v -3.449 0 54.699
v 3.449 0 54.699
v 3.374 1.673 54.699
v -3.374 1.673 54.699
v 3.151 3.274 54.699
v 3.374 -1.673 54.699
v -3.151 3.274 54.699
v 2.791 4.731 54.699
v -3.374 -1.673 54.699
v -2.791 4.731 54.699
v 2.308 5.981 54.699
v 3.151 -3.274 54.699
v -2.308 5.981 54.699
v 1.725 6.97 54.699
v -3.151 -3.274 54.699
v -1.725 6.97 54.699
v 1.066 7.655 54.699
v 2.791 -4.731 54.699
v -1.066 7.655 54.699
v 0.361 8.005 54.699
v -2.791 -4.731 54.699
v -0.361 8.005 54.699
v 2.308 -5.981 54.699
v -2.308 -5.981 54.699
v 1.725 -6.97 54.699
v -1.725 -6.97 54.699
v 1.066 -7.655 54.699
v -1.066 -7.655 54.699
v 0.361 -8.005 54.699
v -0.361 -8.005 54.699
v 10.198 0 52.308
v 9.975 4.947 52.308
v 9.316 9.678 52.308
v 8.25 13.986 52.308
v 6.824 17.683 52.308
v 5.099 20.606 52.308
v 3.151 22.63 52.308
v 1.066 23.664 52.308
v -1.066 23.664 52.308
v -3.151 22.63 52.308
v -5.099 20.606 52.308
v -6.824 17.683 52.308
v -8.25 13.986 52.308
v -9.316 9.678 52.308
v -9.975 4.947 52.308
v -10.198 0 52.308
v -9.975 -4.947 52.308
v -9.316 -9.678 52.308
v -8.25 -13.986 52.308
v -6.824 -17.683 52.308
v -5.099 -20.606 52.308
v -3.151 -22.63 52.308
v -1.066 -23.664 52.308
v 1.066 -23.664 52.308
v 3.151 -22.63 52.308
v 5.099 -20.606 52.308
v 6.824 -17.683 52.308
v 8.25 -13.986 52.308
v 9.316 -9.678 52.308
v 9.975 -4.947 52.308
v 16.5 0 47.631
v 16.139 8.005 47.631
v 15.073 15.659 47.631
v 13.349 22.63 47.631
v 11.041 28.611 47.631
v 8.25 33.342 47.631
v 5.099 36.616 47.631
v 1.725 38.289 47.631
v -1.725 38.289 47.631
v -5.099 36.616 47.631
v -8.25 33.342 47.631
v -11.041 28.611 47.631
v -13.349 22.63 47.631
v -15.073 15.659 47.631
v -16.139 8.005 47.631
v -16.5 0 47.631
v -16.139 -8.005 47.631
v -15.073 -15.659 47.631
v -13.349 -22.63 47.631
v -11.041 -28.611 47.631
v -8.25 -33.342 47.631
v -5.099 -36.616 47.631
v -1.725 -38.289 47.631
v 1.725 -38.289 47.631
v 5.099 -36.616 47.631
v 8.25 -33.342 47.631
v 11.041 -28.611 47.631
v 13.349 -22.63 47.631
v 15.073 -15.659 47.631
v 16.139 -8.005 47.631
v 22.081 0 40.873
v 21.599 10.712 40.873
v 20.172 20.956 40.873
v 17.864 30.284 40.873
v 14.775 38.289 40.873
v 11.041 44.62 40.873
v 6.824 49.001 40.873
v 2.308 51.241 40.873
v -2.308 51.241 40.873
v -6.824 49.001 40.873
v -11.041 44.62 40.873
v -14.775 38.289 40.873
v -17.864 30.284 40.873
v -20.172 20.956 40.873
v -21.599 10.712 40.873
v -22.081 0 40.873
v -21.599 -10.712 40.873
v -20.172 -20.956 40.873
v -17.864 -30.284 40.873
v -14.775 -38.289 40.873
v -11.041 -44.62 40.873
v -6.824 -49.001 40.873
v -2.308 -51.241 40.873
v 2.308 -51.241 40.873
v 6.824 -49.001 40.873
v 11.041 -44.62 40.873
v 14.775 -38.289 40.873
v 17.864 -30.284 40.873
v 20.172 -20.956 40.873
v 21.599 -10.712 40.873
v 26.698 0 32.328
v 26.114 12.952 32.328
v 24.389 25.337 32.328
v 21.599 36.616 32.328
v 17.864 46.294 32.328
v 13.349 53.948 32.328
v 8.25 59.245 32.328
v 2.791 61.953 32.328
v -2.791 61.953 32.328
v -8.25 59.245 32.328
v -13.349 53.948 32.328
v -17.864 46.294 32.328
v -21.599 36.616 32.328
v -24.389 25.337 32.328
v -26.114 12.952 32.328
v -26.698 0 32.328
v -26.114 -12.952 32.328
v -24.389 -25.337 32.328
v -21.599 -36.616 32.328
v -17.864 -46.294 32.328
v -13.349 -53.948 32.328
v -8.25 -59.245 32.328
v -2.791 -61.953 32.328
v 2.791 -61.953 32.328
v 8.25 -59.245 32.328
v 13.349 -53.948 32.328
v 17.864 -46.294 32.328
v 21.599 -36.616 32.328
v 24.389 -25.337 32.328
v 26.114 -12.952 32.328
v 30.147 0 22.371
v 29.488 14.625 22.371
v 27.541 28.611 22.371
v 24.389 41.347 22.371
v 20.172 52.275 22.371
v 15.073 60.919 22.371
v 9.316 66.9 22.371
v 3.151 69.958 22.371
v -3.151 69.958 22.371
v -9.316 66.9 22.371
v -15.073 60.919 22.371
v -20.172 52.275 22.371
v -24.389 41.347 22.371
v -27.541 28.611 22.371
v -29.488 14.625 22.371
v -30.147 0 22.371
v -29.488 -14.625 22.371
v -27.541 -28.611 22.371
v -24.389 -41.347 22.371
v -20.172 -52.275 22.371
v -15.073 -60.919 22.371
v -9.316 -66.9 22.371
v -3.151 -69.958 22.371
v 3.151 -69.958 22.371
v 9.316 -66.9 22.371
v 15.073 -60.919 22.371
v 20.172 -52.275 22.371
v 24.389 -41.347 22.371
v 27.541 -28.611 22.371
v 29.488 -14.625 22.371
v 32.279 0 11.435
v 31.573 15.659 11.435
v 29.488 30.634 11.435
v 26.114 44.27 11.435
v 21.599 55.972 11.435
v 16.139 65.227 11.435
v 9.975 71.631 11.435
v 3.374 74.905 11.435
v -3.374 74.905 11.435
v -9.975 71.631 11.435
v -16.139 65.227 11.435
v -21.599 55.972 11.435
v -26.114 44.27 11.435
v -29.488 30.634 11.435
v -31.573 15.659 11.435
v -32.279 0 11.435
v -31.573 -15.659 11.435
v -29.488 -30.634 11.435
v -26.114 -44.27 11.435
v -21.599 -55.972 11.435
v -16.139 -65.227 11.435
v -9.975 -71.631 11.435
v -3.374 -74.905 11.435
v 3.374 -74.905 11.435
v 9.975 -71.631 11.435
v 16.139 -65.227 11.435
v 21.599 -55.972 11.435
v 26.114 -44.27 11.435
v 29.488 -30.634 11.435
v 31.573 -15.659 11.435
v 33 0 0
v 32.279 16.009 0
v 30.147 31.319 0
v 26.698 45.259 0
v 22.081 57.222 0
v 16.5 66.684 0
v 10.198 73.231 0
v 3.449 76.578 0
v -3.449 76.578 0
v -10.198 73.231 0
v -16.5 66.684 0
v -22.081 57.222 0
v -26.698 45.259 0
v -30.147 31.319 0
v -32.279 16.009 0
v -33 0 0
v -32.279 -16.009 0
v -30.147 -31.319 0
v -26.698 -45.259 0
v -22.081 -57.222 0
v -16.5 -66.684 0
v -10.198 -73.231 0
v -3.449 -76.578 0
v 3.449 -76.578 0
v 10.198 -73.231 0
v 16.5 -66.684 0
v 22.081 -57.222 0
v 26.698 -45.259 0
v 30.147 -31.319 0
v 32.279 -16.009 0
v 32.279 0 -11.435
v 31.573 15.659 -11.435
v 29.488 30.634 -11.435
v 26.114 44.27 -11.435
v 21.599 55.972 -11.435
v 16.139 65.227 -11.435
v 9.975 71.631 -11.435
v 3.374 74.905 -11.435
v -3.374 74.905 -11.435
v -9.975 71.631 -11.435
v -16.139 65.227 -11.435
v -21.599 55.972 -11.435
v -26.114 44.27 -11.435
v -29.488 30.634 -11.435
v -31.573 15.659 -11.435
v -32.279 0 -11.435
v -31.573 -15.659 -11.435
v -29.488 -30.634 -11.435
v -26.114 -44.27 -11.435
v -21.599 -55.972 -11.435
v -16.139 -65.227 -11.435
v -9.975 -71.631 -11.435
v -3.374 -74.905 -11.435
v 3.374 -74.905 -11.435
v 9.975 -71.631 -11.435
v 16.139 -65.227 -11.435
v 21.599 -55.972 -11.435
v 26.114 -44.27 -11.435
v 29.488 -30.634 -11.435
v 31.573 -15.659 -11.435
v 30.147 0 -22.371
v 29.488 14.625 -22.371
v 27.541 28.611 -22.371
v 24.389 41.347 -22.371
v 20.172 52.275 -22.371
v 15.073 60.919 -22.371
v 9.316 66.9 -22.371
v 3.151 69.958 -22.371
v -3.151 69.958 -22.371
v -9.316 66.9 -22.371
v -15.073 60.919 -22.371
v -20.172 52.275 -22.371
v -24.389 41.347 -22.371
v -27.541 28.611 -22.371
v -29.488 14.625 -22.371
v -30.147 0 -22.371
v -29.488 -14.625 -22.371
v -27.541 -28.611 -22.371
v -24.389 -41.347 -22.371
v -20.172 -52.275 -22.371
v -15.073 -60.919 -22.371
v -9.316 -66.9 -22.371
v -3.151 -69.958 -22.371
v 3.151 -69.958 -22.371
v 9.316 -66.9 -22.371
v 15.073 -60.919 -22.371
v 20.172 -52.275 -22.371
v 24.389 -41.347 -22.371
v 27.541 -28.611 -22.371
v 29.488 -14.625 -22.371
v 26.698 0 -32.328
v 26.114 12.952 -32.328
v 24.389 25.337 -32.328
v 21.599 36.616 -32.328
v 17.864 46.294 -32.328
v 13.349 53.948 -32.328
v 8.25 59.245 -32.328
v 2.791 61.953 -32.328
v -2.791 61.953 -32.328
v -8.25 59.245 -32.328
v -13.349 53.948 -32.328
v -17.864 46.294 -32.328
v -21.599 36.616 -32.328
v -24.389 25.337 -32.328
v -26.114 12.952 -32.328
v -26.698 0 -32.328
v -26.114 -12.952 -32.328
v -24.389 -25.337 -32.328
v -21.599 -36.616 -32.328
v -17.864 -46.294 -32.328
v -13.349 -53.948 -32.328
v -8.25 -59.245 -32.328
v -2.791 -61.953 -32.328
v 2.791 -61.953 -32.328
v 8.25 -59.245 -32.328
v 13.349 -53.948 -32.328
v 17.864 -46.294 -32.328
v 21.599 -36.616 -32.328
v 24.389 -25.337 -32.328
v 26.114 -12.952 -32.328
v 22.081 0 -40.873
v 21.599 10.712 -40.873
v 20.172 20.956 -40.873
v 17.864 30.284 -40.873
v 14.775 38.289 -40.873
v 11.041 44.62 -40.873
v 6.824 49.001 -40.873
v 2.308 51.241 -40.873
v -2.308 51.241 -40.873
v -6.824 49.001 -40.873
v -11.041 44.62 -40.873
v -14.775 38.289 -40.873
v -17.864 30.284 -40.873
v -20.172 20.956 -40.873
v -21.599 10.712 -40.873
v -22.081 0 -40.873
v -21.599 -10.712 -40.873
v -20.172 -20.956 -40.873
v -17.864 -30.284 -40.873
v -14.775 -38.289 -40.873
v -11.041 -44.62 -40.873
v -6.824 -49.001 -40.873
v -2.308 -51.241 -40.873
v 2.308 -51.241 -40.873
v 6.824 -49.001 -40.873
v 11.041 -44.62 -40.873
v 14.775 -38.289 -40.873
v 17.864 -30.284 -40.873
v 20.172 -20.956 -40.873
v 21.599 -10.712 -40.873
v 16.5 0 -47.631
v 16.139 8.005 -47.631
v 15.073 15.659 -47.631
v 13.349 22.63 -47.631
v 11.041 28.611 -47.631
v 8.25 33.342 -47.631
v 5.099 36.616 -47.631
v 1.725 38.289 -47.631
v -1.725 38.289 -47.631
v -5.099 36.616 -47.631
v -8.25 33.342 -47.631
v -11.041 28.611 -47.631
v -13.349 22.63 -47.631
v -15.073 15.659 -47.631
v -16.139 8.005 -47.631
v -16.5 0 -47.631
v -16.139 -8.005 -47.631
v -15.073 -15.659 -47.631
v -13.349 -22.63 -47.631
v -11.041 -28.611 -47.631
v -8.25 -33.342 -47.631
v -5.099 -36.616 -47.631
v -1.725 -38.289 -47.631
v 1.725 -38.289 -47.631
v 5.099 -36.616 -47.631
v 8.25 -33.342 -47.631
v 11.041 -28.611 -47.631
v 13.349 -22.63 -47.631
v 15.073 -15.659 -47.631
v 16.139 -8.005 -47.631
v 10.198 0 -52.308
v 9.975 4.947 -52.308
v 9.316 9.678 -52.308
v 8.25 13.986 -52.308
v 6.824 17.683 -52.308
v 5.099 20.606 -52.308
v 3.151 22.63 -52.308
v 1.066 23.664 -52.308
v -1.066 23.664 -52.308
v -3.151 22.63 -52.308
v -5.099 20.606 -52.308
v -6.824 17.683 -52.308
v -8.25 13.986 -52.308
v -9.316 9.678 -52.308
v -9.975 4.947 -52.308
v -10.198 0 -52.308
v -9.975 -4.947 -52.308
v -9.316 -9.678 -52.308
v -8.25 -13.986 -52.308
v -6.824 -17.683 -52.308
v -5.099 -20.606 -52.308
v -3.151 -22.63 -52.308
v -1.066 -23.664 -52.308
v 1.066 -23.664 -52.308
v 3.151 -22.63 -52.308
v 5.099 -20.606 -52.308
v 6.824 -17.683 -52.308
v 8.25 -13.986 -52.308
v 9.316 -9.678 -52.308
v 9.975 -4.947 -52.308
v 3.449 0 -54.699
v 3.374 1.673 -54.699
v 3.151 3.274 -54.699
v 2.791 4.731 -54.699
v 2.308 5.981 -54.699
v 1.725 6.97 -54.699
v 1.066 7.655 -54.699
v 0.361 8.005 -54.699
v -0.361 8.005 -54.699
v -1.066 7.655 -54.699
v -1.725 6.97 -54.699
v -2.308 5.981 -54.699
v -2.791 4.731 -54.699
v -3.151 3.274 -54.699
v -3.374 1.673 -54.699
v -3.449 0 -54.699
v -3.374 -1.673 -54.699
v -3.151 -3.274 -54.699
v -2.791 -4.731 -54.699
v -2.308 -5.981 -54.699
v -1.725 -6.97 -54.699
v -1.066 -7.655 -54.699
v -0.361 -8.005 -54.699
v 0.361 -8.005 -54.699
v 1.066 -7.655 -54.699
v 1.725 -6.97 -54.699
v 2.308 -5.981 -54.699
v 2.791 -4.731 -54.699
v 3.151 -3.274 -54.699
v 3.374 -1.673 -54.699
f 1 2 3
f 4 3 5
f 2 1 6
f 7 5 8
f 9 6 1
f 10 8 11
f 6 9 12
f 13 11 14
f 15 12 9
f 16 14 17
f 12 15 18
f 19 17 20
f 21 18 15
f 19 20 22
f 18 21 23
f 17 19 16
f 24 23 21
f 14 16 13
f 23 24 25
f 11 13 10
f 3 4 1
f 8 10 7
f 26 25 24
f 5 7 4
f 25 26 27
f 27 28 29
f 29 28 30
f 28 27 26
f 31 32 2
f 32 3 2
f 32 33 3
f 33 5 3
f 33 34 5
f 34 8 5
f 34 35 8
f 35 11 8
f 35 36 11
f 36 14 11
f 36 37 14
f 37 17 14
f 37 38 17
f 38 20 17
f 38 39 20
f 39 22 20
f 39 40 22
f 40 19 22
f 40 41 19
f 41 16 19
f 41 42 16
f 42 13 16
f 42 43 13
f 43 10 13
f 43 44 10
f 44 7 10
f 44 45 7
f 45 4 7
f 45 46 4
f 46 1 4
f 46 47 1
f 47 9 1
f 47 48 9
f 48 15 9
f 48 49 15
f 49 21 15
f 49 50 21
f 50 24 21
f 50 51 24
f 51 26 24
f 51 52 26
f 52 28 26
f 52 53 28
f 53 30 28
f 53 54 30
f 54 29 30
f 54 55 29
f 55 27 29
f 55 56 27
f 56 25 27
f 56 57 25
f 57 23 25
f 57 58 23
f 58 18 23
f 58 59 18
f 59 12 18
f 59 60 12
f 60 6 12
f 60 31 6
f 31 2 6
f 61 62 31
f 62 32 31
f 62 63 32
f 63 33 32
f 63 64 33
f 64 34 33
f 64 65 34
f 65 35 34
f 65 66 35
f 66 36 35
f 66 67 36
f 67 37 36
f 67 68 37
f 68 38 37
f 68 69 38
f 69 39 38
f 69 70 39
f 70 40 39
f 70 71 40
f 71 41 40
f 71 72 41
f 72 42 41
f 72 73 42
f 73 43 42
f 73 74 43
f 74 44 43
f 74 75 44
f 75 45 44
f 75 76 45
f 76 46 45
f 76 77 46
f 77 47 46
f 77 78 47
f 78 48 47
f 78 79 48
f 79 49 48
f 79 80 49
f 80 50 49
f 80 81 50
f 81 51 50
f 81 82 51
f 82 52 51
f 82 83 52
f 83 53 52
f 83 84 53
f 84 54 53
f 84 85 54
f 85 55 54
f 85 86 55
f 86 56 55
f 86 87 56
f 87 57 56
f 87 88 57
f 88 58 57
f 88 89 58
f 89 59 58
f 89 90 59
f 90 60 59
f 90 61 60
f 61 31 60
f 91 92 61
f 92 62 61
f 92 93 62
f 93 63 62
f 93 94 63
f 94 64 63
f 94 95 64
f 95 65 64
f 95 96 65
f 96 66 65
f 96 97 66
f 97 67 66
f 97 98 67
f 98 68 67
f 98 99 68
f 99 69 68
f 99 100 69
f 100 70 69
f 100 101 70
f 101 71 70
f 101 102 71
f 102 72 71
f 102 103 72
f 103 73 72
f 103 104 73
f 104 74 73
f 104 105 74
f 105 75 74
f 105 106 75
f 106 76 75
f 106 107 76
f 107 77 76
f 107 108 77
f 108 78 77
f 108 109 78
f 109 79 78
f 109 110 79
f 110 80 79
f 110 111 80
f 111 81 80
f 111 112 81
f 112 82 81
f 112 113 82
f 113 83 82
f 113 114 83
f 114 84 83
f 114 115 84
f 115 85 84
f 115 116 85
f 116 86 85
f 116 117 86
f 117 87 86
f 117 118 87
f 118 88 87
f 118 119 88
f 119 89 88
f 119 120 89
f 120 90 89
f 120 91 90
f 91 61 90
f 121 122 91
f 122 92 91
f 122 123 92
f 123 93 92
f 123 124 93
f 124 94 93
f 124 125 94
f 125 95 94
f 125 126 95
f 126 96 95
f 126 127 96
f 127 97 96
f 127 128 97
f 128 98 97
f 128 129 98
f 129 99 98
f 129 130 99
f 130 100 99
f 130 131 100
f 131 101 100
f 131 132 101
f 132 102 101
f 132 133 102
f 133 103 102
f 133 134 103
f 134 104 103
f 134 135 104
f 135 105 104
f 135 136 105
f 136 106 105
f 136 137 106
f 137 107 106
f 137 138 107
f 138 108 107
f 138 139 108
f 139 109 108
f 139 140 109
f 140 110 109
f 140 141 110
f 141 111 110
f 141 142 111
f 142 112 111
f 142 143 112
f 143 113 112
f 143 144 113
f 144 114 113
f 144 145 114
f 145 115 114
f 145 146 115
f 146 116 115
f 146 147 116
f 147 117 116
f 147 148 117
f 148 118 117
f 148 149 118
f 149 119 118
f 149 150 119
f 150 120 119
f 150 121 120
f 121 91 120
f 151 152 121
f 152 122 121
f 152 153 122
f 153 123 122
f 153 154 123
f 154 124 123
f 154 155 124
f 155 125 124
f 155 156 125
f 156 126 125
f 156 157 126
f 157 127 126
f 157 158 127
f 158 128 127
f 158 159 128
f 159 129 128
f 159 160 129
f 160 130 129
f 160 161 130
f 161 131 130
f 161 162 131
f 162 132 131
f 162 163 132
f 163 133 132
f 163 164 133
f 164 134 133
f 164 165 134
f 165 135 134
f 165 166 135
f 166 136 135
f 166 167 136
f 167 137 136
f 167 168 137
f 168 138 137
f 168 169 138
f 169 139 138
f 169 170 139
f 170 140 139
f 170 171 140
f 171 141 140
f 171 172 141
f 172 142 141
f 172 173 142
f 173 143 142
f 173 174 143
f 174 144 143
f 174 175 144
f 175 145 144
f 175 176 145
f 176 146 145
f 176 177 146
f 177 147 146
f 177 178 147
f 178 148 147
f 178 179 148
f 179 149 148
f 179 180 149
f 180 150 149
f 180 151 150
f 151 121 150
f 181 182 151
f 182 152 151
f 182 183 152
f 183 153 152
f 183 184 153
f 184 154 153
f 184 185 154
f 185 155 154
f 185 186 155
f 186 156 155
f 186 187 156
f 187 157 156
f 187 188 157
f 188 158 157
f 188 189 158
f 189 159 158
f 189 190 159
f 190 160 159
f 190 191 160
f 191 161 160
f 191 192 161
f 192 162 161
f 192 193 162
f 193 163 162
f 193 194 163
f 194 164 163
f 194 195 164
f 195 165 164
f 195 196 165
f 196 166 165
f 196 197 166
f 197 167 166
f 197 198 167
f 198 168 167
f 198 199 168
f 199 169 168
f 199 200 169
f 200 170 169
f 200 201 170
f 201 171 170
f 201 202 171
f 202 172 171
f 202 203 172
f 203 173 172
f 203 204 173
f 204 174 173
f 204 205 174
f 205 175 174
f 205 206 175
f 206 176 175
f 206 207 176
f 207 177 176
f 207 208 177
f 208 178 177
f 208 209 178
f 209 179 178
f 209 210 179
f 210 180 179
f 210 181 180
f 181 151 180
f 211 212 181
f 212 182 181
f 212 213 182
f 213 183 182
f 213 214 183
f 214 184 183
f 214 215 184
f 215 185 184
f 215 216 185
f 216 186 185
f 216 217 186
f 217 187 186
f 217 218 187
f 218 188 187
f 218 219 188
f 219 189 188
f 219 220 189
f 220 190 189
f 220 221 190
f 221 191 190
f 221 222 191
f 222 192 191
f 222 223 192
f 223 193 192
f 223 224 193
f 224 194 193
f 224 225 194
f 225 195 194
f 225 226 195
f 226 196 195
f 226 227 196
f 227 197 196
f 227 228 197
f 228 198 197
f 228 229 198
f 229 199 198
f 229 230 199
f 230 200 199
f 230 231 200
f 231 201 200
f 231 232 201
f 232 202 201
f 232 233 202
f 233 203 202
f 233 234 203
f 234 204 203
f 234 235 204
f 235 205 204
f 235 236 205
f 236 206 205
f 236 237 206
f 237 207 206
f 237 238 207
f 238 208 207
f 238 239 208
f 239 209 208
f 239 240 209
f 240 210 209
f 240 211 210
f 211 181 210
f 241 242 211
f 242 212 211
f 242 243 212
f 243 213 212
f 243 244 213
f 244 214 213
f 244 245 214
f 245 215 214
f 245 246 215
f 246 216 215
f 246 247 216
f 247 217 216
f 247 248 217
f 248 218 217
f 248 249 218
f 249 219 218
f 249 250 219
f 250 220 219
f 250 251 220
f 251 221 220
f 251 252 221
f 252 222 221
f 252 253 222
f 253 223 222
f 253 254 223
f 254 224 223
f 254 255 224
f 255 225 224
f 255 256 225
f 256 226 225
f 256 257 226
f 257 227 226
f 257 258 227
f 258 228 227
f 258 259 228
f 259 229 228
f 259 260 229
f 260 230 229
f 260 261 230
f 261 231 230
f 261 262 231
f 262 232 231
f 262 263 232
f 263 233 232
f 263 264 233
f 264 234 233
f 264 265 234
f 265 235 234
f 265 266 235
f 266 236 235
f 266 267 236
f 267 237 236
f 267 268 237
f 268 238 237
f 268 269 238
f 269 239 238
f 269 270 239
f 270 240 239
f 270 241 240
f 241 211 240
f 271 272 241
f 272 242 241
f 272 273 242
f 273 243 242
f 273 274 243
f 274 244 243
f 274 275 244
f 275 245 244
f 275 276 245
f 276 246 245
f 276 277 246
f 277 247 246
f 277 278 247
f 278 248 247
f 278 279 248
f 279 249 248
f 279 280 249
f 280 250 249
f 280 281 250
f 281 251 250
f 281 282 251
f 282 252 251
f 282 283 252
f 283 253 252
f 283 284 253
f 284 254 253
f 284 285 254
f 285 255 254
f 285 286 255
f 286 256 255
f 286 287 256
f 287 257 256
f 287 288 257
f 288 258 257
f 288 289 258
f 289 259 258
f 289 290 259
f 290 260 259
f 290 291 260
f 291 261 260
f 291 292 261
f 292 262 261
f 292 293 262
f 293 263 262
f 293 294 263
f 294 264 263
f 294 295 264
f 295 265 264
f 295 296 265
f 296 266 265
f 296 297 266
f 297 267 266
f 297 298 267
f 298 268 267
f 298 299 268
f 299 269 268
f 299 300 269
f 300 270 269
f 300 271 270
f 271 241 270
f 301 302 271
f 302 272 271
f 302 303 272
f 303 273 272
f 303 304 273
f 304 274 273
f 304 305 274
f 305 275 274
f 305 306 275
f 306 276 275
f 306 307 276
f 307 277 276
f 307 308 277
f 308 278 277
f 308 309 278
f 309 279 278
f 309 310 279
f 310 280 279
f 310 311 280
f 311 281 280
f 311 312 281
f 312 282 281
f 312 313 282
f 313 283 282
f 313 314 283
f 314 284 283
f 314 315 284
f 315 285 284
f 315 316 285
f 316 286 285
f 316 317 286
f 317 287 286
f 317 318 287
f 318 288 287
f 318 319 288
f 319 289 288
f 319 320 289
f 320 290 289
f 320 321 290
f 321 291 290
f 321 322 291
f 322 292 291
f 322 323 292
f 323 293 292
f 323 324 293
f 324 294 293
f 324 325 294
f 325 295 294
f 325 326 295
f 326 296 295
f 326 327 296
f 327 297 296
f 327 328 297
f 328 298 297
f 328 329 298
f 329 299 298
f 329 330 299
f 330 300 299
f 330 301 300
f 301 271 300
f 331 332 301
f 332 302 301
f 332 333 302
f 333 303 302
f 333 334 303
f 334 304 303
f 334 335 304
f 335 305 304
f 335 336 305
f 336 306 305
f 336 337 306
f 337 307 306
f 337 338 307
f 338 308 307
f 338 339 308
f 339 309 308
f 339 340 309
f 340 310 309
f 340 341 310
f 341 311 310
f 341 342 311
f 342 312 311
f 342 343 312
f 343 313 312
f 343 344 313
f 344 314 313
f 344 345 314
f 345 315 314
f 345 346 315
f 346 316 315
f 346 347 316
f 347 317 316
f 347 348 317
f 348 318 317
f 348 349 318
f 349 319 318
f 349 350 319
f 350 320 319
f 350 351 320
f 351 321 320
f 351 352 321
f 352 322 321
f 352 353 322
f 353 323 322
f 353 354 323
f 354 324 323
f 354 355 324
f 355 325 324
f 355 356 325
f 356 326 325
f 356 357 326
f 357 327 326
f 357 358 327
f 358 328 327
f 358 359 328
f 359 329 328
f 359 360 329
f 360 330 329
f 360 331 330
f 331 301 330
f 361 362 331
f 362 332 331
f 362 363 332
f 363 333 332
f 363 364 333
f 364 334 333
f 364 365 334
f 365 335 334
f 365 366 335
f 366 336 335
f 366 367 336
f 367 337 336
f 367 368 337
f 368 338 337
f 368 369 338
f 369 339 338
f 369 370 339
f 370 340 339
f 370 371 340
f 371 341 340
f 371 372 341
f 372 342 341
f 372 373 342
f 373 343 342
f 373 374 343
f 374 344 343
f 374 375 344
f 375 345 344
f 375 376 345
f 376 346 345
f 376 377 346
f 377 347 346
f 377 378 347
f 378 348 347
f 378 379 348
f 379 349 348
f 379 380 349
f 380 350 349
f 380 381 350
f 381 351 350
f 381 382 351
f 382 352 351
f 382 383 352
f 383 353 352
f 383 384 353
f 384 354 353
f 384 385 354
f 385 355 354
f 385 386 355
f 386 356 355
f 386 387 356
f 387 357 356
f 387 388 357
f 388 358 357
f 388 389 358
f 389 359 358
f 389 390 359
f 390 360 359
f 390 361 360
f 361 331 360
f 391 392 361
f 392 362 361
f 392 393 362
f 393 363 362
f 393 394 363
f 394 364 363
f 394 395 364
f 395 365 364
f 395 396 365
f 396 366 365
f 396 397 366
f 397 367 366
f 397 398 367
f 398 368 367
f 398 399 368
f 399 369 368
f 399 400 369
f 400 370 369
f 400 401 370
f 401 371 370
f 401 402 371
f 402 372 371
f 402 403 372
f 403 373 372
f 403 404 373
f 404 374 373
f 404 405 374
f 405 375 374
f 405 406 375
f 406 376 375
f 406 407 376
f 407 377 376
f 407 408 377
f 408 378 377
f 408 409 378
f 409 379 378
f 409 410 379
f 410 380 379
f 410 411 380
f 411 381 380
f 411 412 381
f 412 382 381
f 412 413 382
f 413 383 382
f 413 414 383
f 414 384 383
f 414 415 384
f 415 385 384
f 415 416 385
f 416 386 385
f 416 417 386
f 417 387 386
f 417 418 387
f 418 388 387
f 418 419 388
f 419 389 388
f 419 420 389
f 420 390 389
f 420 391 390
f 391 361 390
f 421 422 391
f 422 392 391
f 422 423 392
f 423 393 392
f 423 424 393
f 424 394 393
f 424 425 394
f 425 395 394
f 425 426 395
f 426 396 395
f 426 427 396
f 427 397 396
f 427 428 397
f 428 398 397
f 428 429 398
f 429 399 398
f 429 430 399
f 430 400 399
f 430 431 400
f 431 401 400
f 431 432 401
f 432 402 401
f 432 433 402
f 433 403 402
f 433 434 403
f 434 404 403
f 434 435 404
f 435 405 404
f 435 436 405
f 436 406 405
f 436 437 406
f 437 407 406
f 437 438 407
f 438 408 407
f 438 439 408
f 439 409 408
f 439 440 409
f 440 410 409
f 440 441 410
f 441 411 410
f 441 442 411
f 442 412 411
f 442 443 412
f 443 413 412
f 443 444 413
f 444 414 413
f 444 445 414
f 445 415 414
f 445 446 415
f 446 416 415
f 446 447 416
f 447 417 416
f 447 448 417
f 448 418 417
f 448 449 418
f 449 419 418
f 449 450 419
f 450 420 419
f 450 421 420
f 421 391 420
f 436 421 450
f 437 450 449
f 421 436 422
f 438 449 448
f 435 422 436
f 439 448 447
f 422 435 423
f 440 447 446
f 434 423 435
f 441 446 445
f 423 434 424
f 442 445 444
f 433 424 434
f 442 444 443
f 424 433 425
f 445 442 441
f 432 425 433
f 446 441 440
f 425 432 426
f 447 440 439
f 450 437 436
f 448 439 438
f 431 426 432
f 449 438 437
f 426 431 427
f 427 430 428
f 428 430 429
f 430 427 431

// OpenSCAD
// Generated by SolidPython 1.0.1 on 2020-07-29 00:46:45


scale(v = [3, 7, 5]) {
	sphere(r = 11);
}
/***********************************************
*********      SolidPython code:      **********
************************************************
 
# import packages: SolidPython
from solid import *
from solid.utils import *
from itertools import chain, combinations, permutations


class Resize:

    def __init__(self, scad_file):
        self.scad_file = scad_file
        #self.scad_file = import_scad(scad_file)
        # cone/cylinder param:
        self.r1 = 0
        self.r2 = 0
        self.h = 0
        # rectangular prism param:
        self.w = 0
        self.l = 0
        # ellipse param:
        self.r = 0

    # import OpenScad code (file name corresponds to shape)


    # classify shape + parameters
    def assign(self, param1, param2, param3):
        if self.scad_file == 'cone.scad':
            self.r1 = param1
            self.r2 = param2
            self.h = param3
        elif self.scad_file == 'cylinder.scad':
            self.r1 = param1
            self.r2 = param2
            self.h = param3
        elif self.scad_file == 'rectangularPrism.scad':
            self.h = param1
            self.l = param2
            self.w = param3
        else:
            self.r = param1
            self.h = param2

    # resize parameters
    def iterate(self):
        x = range(3, 20, 2)
        i = 1
        if self.scad_file == 'cone.scad':
            tempList = list(permutations(x, 2))
            for temp in tempList:
                param1 = temp[0]
                param2 = temp[1]
                filepath = 'produced_scad_files/' + 'cone' + str(param1) + '_' + str(param2) + '_' + '.scad'
                scad_render_to_file(cylinder(h=param1, r1=param2, r2=0), filepath)

        elif self.scad_file == 'cylinder.scad':
            tempList = list(permutations(x, 3))
            for temp in tempList:
                param1 = temp[0]
                param2 = temp[1]
                filepath = 'produced_scad_files/' + 'cylinder' + str(param1) + '_' + str(param2) + '_' + '.scad'
                scad_render_to_file(cylinder(h=param1, r1=param2, r2=param2), filepath)

        elif self.scad_file == 'rectangularPrism.scad':
            tempList = list(permutations(x, 3))
            for temp in tempList:
                param1 = temp[0]
                param2 = temp[1]
                param3 = temp[2]
                filepath = 'produced_scad_files/' + 'rectangularPrism' + str(param1) + '_' + str(param2) + '_' + str(
                    param3) + '.scad'
                scad_render_to_file(cube(size=(param1, param2, param3)), filepath)

        elif self.scad_file == 'ellipse.scad':
            tempList = list(permutations(x, 4))
            for temp in tempList:
                param1 = temp[0]
                param2 = temp[1]
                param3 = temp[2]
                param4 = temp[3]
                filepath = 'produced_scad_files/' + 'ellipse' + str(param1) + '_' + str(param2) + '_' + str(param3) + '_' + str(param4) + '.scad'
                scad_render_to_file(scale([param1, param2, param3])(sphere(r=param4)), filepath)

    def render_to_scadfile(self):
        scad_render_to_file(scad, 'example.scad') 
 
************************************************/
